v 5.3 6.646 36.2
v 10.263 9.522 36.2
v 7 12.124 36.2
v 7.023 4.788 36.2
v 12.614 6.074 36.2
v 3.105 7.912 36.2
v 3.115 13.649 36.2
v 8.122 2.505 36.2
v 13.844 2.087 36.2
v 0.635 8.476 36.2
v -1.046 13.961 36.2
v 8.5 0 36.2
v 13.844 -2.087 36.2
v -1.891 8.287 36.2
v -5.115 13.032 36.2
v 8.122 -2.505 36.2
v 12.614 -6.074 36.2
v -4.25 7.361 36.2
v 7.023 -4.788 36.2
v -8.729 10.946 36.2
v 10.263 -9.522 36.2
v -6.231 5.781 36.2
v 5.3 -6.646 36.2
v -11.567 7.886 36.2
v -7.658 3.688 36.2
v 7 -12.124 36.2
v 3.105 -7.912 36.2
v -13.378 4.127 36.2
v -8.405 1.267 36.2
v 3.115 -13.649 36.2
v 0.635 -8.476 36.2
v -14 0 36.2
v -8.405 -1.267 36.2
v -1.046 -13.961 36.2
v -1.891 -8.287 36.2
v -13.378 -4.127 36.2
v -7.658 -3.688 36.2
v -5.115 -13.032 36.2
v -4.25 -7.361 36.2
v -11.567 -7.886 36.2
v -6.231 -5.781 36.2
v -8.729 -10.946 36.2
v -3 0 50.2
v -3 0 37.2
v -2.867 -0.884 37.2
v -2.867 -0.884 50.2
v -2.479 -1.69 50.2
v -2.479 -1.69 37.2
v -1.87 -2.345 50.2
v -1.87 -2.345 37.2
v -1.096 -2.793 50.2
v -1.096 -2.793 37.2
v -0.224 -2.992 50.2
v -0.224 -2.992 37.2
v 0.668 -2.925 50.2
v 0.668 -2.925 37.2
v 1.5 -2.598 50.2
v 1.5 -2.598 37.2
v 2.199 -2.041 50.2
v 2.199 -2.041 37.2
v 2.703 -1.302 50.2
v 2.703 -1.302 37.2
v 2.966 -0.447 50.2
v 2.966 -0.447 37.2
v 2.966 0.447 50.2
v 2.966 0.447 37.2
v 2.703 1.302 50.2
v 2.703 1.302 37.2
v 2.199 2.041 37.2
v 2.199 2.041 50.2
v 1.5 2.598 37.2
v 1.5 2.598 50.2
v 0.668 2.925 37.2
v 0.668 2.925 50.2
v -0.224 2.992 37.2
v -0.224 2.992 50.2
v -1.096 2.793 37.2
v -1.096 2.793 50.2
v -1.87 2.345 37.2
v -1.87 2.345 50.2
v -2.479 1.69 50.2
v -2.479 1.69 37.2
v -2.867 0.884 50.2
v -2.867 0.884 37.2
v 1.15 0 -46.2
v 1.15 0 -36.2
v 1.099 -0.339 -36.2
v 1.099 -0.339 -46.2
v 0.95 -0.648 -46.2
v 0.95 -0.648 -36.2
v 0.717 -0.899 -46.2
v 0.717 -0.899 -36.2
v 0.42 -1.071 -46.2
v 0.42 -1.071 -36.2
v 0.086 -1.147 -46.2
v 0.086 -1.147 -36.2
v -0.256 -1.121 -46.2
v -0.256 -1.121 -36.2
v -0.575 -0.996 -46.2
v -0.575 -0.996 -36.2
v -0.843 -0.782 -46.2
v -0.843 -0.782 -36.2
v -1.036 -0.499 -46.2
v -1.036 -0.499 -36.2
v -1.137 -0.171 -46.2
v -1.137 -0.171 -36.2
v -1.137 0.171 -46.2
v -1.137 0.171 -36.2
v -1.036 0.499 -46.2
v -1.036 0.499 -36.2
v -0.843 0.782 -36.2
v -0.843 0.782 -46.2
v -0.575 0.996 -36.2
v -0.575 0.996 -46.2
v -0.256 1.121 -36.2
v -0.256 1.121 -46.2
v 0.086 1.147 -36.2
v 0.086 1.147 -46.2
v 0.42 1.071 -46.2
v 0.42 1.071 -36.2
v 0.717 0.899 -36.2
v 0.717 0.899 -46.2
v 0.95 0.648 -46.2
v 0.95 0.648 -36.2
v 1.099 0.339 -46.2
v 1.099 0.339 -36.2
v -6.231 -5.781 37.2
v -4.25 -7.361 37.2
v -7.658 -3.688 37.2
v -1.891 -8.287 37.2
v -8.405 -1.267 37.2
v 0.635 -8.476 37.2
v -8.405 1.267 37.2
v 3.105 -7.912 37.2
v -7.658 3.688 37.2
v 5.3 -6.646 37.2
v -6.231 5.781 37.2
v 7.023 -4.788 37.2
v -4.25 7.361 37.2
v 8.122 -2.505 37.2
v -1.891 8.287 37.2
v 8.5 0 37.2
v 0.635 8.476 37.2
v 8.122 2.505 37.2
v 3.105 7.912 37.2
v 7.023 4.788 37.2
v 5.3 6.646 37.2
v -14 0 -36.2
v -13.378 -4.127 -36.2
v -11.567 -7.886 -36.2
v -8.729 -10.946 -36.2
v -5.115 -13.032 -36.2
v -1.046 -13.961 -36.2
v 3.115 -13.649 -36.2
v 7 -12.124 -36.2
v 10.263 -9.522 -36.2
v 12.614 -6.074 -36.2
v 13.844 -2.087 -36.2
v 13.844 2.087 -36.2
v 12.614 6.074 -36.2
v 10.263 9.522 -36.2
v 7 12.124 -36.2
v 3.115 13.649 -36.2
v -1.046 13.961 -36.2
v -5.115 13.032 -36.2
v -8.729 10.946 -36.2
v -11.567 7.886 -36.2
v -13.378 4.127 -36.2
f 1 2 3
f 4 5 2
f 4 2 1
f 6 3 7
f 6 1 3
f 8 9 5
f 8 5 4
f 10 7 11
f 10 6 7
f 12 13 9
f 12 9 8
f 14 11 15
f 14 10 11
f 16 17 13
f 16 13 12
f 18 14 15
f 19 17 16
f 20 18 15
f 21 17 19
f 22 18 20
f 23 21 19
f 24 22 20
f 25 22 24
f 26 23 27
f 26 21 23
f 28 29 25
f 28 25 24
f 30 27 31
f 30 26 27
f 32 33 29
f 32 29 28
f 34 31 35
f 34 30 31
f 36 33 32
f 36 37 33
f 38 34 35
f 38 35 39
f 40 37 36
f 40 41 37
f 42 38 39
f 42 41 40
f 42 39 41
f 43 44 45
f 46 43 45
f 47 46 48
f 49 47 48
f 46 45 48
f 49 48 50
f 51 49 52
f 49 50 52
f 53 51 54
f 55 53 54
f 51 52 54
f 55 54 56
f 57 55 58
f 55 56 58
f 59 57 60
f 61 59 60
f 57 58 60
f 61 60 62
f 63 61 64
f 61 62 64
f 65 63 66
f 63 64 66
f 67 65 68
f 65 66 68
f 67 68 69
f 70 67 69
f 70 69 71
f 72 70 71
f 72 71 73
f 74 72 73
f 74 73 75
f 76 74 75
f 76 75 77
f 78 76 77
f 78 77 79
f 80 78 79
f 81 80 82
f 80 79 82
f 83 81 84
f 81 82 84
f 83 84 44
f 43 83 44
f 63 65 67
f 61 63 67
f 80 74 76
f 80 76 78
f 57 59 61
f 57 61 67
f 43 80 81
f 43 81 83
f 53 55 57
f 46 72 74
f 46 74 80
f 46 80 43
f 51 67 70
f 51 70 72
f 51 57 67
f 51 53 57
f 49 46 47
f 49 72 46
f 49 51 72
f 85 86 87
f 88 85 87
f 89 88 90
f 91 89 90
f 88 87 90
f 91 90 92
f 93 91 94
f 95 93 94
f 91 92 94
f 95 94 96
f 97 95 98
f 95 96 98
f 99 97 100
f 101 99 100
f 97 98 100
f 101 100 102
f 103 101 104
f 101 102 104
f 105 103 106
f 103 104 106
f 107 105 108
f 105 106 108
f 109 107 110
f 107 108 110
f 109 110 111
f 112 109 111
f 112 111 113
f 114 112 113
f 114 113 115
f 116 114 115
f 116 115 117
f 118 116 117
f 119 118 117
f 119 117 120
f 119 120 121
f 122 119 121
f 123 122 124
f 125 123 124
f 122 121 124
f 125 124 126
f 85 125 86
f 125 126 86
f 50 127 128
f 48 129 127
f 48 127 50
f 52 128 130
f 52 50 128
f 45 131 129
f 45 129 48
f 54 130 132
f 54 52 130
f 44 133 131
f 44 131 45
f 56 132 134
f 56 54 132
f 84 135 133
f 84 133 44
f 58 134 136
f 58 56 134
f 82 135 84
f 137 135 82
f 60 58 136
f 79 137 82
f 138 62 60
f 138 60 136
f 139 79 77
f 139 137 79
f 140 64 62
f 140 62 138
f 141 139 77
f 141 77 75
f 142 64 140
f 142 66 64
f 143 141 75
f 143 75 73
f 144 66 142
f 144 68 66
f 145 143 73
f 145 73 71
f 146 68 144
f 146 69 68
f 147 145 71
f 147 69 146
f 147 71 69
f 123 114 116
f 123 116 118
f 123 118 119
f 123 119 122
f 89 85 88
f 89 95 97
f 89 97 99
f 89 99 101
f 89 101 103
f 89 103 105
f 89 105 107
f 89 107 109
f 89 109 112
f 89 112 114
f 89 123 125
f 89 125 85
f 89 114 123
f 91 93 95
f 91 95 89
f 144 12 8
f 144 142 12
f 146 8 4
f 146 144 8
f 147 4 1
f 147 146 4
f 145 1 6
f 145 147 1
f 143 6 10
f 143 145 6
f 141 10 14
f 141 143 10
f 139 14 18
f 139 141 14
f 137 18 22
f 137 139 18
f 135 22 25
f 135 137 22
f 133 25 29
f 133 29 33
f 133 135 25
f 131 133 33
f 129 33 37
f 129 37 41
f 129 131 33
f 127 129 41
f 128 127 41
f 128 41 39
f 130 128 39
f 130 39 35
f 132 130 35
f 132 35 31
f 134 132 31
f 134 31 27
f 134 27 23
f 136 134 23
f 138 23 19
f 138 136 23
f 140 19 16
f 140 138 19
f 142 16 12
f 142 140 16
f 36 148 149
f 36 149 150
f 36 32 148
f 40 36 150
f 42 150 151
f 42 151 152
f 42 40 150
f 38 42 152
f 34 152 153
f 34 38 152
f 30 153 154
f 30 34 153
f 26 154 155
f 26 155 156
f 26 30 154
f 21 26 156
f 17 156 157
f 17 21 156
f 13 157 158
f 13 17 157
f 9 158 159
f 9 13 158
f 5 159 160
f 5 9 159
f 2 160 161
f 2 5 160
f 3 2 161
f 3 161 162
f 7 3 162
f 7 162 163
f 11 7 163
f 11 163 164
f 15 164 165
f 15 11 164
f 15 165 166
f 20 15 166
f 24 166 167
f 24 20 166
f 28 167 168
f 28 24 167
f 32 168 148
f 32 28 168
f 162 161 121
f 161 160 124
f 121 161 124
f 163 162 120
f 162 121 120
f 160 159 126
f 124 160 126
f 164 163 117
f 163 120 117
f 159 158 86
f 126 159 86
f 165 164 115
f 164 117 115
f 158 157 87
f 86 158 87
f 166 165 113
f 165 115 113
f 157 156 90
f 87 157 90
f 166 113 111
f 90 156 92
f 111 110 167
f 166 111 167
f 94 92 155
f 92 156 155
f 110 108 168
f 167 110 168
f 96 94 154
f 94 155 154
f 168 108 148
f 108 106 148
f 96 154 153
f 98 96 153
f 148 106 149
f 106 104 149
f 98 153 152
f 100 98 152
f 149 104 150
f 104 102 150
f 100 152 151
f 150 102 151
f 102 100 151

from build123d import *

# Parameters (mm, degrees)
SKETCH1_R           = 14
BOSS_EXTRUDE1_DEPTH = 36.2
SKETCH2_R           = 8.5
BOSS_EXTRUDE2_DEPTH = 1
SKETCH3_R           = 3
BOSS_EXTRUDE3_DEPTH = 13
SKETCH5_R           = 1.15
BOSS_EXTRUDE4_DEPTH = 10


with BuildPart() as part:
    # Sketch1 → Boss-Extrude1 (new, symmetric)
    with BuildSketch(Plane.XY):
        with Locations(Location((0, 0, 0), (0, 0, 180))):
            Circle(SKETCH1_R)
    extrude(amount=BOSS_EXTRUDE1_DEPTH, both=True)

    # Sketch2 → Boss-Extrude2 (add, symmetric)
    with BuildSketch(Plane.XY.offset(36.2)):
        Circle(SKETCH2_R)
    extrude(amount=BOSS_EXTRUDE2_DEPTH, both=True)

    # Sketch3 → Boss-Extrude3 (add)
    with BuildSketch(Plane.XY.offset(37.2)):
        with Locations(Location((0, 0, 0), (0, 0, 180))):
            Circle(SKETCH3_R)
    extrude(amount=BOSS_EXTRUDE3_DEPTH)

    # Sketch5 → Boss-Extrude4 (add)
    with BuildSketch(Plane(origin=(0, 0, -36.2), x_dir=(-1, 0, 0), z_dir=(0, 0, -1))):
        with Locations(Location((0, 0, 0), (0, 0, 180))):
            Circle(SKETCH5_R)
    extrude(amount=BOSS_EXTRUDE4_DEPTH)


solid = part.part
